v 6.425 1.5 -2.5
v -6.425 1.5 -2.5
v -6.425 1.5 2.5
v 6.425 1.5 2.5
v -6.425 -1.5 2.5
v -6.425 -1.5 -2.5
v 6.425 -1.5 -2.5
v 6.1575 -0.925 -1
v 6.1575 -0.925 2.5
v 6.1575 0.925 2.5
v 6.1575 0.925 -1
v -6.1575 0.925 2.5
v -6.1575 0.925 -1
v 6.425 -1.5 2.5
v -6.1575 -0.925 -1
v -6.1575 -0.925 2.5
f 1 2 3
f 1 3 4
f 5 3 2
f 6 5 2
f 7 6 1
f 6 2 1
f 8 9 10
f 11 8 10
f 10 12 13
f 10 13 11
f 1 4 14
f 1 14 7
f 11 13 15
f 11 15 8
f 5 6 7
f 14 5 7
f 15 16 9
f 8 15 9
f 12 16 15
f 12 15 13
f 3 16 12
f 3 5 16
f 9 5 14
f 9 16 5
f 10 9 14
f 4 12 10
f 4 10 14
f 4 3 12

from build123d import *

# Parameters (mm, degrees)
SKETCH1_W           = 12.85
SKETCH1_H           = 5
BOSS_EXTRUDE1_DEPTH = 1.5
SKETCH3_W           = 12.31491511
SKETCH3_H           = 1.85
CUT_EXTRUDE1_DEPTH  = 3.5


with BuildPart() as part:
    # Sketch1 → Boss-Extrude1 (new body, symmetric)
    with BuildSketch(Plane(origin=(0, 0, 0), x_dir=(1, 0, 0), z_dir=(0, 1, 0))):
        Rectangle(SKETCH1_W, SKETCH1_H)
    extrude(amount=BOSS_EXTRUDE1_DEPTH, both=True)

    # Sketch3 → Cut-Extrude1 (cut)
    with BuildSketch(Plane.XY.offset(2.5)):
        Rectangle(SKETCH3_W, SKETCH3_H)
    extrude(amount=-CUT_EXTRUDE1_DEPTH, mode=Mode.SUBTRACT)


solid = part.part
